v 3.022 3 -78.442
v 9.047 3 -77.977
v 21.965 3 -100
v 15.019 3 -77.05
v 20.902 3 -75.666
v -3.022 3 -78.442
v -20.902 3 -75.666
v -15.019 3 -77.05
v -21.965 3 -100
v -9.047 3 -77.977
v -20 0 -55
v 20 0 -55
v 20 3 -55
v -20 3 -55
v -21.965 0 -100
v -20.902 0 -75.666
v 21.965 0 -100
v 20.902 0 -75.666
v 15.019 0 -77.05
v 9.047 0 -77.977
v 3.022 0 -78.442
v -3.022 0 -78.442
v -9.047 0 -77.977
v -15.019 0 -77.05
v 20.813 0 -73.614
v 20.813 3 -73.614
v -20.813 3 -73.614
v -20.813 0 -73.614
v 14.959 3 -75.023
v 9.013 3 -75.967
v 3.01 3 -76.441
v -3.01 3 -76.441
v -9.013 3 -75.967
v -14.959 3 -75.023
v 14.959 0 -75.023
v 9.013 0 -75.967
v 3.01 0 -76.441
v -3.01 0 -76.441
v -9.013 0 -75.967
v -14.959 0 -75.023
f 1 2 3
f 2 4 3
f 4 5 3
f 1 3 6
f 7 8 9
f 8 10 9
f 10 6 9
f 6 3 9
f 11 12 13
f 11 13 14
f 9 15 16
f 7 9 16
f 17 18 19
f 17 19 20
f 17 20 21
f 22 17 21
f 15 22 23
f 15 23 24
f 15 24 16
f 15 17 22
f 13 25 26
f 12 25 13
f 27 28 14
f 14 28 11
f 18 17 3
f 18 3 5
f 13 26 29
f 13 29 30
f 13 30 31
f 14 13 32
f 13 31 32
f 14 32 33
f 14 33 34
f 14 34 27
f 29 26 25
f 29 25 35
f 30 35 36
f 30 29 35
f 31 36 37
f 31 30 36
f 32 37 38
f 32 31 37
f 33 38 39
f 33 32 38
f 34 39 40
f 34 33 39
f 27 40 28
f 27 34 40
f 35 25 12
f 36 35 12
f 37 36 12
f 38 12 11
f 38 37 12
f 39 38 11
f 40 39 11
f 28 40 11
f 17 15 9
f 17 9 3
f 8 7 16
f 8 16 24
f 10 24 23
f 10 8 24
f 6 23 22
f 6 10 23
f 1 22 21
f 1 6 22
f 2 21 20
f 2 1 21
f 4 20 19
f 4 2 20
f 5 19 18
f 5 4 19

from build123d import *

# Parameters (mm, degrees)
BOSS_EXTRUDE1_DEPTH     = 3
CUT_EXTRUDE1_DEPTH      = 1
CUT_EXTRUDE1_DEPTH_BACK = 4


with BuildPart() as part:
    # Sketch1 → Boss-Extrude1 (new body)
    with BuildSketch(Plane(origin=(0, 0, 0), x_dir=(1, 0, 0), z_dir=(0, 1, 0))):
        Polygon((-21.964742431, 100), (-20, 55), (0, 55), (0, 100), align=None)
    boss_extrude1 = extrude(amount=BOSS_EXTRUDE1_DEPTH)

    # Mirror2: Boss-Extrude1 across plane
    add(boss_extrude1.mirror(Plane(origin=(0, 0, 0), x_dir=(0, 0, 1), z_dir=(1, 0, 0))))

    # Sketch2 → Cut-Extrude1 (cut, two sides)
    with BuildSketch(Plane(origin=(0, 3, 0), x_dir=(1, 0, 0), z_dir=(0, 1, 0))) as cut_extrude1_sk:
        with BuildLine():
            Line((-20.812722462, 73.61440473), (-20.902297167, 75.666002757))
            ThreePointArc((-20.902297167, 75.666002757), (0, 78.5), (20.902297167, 75.666002757))
            Line((20.902297167, 75.666002757), (20.812722462, 73.61440473))
            ThreePointArc((20.812722462, 73.61440473), (0, 76.5), (-20.812722462, 73.61440473))
        make_face()
    extrude(amount=CUT_EXTRUDE1_DEPTH, mode=Mode.SUBTRACT)
    extrude(cut_extrude1_sk.sketch, amount=-CUT_EXTRUDE1_DEPTH_BACK, mode=Mode.SUBTRACT)


solid = part.part
